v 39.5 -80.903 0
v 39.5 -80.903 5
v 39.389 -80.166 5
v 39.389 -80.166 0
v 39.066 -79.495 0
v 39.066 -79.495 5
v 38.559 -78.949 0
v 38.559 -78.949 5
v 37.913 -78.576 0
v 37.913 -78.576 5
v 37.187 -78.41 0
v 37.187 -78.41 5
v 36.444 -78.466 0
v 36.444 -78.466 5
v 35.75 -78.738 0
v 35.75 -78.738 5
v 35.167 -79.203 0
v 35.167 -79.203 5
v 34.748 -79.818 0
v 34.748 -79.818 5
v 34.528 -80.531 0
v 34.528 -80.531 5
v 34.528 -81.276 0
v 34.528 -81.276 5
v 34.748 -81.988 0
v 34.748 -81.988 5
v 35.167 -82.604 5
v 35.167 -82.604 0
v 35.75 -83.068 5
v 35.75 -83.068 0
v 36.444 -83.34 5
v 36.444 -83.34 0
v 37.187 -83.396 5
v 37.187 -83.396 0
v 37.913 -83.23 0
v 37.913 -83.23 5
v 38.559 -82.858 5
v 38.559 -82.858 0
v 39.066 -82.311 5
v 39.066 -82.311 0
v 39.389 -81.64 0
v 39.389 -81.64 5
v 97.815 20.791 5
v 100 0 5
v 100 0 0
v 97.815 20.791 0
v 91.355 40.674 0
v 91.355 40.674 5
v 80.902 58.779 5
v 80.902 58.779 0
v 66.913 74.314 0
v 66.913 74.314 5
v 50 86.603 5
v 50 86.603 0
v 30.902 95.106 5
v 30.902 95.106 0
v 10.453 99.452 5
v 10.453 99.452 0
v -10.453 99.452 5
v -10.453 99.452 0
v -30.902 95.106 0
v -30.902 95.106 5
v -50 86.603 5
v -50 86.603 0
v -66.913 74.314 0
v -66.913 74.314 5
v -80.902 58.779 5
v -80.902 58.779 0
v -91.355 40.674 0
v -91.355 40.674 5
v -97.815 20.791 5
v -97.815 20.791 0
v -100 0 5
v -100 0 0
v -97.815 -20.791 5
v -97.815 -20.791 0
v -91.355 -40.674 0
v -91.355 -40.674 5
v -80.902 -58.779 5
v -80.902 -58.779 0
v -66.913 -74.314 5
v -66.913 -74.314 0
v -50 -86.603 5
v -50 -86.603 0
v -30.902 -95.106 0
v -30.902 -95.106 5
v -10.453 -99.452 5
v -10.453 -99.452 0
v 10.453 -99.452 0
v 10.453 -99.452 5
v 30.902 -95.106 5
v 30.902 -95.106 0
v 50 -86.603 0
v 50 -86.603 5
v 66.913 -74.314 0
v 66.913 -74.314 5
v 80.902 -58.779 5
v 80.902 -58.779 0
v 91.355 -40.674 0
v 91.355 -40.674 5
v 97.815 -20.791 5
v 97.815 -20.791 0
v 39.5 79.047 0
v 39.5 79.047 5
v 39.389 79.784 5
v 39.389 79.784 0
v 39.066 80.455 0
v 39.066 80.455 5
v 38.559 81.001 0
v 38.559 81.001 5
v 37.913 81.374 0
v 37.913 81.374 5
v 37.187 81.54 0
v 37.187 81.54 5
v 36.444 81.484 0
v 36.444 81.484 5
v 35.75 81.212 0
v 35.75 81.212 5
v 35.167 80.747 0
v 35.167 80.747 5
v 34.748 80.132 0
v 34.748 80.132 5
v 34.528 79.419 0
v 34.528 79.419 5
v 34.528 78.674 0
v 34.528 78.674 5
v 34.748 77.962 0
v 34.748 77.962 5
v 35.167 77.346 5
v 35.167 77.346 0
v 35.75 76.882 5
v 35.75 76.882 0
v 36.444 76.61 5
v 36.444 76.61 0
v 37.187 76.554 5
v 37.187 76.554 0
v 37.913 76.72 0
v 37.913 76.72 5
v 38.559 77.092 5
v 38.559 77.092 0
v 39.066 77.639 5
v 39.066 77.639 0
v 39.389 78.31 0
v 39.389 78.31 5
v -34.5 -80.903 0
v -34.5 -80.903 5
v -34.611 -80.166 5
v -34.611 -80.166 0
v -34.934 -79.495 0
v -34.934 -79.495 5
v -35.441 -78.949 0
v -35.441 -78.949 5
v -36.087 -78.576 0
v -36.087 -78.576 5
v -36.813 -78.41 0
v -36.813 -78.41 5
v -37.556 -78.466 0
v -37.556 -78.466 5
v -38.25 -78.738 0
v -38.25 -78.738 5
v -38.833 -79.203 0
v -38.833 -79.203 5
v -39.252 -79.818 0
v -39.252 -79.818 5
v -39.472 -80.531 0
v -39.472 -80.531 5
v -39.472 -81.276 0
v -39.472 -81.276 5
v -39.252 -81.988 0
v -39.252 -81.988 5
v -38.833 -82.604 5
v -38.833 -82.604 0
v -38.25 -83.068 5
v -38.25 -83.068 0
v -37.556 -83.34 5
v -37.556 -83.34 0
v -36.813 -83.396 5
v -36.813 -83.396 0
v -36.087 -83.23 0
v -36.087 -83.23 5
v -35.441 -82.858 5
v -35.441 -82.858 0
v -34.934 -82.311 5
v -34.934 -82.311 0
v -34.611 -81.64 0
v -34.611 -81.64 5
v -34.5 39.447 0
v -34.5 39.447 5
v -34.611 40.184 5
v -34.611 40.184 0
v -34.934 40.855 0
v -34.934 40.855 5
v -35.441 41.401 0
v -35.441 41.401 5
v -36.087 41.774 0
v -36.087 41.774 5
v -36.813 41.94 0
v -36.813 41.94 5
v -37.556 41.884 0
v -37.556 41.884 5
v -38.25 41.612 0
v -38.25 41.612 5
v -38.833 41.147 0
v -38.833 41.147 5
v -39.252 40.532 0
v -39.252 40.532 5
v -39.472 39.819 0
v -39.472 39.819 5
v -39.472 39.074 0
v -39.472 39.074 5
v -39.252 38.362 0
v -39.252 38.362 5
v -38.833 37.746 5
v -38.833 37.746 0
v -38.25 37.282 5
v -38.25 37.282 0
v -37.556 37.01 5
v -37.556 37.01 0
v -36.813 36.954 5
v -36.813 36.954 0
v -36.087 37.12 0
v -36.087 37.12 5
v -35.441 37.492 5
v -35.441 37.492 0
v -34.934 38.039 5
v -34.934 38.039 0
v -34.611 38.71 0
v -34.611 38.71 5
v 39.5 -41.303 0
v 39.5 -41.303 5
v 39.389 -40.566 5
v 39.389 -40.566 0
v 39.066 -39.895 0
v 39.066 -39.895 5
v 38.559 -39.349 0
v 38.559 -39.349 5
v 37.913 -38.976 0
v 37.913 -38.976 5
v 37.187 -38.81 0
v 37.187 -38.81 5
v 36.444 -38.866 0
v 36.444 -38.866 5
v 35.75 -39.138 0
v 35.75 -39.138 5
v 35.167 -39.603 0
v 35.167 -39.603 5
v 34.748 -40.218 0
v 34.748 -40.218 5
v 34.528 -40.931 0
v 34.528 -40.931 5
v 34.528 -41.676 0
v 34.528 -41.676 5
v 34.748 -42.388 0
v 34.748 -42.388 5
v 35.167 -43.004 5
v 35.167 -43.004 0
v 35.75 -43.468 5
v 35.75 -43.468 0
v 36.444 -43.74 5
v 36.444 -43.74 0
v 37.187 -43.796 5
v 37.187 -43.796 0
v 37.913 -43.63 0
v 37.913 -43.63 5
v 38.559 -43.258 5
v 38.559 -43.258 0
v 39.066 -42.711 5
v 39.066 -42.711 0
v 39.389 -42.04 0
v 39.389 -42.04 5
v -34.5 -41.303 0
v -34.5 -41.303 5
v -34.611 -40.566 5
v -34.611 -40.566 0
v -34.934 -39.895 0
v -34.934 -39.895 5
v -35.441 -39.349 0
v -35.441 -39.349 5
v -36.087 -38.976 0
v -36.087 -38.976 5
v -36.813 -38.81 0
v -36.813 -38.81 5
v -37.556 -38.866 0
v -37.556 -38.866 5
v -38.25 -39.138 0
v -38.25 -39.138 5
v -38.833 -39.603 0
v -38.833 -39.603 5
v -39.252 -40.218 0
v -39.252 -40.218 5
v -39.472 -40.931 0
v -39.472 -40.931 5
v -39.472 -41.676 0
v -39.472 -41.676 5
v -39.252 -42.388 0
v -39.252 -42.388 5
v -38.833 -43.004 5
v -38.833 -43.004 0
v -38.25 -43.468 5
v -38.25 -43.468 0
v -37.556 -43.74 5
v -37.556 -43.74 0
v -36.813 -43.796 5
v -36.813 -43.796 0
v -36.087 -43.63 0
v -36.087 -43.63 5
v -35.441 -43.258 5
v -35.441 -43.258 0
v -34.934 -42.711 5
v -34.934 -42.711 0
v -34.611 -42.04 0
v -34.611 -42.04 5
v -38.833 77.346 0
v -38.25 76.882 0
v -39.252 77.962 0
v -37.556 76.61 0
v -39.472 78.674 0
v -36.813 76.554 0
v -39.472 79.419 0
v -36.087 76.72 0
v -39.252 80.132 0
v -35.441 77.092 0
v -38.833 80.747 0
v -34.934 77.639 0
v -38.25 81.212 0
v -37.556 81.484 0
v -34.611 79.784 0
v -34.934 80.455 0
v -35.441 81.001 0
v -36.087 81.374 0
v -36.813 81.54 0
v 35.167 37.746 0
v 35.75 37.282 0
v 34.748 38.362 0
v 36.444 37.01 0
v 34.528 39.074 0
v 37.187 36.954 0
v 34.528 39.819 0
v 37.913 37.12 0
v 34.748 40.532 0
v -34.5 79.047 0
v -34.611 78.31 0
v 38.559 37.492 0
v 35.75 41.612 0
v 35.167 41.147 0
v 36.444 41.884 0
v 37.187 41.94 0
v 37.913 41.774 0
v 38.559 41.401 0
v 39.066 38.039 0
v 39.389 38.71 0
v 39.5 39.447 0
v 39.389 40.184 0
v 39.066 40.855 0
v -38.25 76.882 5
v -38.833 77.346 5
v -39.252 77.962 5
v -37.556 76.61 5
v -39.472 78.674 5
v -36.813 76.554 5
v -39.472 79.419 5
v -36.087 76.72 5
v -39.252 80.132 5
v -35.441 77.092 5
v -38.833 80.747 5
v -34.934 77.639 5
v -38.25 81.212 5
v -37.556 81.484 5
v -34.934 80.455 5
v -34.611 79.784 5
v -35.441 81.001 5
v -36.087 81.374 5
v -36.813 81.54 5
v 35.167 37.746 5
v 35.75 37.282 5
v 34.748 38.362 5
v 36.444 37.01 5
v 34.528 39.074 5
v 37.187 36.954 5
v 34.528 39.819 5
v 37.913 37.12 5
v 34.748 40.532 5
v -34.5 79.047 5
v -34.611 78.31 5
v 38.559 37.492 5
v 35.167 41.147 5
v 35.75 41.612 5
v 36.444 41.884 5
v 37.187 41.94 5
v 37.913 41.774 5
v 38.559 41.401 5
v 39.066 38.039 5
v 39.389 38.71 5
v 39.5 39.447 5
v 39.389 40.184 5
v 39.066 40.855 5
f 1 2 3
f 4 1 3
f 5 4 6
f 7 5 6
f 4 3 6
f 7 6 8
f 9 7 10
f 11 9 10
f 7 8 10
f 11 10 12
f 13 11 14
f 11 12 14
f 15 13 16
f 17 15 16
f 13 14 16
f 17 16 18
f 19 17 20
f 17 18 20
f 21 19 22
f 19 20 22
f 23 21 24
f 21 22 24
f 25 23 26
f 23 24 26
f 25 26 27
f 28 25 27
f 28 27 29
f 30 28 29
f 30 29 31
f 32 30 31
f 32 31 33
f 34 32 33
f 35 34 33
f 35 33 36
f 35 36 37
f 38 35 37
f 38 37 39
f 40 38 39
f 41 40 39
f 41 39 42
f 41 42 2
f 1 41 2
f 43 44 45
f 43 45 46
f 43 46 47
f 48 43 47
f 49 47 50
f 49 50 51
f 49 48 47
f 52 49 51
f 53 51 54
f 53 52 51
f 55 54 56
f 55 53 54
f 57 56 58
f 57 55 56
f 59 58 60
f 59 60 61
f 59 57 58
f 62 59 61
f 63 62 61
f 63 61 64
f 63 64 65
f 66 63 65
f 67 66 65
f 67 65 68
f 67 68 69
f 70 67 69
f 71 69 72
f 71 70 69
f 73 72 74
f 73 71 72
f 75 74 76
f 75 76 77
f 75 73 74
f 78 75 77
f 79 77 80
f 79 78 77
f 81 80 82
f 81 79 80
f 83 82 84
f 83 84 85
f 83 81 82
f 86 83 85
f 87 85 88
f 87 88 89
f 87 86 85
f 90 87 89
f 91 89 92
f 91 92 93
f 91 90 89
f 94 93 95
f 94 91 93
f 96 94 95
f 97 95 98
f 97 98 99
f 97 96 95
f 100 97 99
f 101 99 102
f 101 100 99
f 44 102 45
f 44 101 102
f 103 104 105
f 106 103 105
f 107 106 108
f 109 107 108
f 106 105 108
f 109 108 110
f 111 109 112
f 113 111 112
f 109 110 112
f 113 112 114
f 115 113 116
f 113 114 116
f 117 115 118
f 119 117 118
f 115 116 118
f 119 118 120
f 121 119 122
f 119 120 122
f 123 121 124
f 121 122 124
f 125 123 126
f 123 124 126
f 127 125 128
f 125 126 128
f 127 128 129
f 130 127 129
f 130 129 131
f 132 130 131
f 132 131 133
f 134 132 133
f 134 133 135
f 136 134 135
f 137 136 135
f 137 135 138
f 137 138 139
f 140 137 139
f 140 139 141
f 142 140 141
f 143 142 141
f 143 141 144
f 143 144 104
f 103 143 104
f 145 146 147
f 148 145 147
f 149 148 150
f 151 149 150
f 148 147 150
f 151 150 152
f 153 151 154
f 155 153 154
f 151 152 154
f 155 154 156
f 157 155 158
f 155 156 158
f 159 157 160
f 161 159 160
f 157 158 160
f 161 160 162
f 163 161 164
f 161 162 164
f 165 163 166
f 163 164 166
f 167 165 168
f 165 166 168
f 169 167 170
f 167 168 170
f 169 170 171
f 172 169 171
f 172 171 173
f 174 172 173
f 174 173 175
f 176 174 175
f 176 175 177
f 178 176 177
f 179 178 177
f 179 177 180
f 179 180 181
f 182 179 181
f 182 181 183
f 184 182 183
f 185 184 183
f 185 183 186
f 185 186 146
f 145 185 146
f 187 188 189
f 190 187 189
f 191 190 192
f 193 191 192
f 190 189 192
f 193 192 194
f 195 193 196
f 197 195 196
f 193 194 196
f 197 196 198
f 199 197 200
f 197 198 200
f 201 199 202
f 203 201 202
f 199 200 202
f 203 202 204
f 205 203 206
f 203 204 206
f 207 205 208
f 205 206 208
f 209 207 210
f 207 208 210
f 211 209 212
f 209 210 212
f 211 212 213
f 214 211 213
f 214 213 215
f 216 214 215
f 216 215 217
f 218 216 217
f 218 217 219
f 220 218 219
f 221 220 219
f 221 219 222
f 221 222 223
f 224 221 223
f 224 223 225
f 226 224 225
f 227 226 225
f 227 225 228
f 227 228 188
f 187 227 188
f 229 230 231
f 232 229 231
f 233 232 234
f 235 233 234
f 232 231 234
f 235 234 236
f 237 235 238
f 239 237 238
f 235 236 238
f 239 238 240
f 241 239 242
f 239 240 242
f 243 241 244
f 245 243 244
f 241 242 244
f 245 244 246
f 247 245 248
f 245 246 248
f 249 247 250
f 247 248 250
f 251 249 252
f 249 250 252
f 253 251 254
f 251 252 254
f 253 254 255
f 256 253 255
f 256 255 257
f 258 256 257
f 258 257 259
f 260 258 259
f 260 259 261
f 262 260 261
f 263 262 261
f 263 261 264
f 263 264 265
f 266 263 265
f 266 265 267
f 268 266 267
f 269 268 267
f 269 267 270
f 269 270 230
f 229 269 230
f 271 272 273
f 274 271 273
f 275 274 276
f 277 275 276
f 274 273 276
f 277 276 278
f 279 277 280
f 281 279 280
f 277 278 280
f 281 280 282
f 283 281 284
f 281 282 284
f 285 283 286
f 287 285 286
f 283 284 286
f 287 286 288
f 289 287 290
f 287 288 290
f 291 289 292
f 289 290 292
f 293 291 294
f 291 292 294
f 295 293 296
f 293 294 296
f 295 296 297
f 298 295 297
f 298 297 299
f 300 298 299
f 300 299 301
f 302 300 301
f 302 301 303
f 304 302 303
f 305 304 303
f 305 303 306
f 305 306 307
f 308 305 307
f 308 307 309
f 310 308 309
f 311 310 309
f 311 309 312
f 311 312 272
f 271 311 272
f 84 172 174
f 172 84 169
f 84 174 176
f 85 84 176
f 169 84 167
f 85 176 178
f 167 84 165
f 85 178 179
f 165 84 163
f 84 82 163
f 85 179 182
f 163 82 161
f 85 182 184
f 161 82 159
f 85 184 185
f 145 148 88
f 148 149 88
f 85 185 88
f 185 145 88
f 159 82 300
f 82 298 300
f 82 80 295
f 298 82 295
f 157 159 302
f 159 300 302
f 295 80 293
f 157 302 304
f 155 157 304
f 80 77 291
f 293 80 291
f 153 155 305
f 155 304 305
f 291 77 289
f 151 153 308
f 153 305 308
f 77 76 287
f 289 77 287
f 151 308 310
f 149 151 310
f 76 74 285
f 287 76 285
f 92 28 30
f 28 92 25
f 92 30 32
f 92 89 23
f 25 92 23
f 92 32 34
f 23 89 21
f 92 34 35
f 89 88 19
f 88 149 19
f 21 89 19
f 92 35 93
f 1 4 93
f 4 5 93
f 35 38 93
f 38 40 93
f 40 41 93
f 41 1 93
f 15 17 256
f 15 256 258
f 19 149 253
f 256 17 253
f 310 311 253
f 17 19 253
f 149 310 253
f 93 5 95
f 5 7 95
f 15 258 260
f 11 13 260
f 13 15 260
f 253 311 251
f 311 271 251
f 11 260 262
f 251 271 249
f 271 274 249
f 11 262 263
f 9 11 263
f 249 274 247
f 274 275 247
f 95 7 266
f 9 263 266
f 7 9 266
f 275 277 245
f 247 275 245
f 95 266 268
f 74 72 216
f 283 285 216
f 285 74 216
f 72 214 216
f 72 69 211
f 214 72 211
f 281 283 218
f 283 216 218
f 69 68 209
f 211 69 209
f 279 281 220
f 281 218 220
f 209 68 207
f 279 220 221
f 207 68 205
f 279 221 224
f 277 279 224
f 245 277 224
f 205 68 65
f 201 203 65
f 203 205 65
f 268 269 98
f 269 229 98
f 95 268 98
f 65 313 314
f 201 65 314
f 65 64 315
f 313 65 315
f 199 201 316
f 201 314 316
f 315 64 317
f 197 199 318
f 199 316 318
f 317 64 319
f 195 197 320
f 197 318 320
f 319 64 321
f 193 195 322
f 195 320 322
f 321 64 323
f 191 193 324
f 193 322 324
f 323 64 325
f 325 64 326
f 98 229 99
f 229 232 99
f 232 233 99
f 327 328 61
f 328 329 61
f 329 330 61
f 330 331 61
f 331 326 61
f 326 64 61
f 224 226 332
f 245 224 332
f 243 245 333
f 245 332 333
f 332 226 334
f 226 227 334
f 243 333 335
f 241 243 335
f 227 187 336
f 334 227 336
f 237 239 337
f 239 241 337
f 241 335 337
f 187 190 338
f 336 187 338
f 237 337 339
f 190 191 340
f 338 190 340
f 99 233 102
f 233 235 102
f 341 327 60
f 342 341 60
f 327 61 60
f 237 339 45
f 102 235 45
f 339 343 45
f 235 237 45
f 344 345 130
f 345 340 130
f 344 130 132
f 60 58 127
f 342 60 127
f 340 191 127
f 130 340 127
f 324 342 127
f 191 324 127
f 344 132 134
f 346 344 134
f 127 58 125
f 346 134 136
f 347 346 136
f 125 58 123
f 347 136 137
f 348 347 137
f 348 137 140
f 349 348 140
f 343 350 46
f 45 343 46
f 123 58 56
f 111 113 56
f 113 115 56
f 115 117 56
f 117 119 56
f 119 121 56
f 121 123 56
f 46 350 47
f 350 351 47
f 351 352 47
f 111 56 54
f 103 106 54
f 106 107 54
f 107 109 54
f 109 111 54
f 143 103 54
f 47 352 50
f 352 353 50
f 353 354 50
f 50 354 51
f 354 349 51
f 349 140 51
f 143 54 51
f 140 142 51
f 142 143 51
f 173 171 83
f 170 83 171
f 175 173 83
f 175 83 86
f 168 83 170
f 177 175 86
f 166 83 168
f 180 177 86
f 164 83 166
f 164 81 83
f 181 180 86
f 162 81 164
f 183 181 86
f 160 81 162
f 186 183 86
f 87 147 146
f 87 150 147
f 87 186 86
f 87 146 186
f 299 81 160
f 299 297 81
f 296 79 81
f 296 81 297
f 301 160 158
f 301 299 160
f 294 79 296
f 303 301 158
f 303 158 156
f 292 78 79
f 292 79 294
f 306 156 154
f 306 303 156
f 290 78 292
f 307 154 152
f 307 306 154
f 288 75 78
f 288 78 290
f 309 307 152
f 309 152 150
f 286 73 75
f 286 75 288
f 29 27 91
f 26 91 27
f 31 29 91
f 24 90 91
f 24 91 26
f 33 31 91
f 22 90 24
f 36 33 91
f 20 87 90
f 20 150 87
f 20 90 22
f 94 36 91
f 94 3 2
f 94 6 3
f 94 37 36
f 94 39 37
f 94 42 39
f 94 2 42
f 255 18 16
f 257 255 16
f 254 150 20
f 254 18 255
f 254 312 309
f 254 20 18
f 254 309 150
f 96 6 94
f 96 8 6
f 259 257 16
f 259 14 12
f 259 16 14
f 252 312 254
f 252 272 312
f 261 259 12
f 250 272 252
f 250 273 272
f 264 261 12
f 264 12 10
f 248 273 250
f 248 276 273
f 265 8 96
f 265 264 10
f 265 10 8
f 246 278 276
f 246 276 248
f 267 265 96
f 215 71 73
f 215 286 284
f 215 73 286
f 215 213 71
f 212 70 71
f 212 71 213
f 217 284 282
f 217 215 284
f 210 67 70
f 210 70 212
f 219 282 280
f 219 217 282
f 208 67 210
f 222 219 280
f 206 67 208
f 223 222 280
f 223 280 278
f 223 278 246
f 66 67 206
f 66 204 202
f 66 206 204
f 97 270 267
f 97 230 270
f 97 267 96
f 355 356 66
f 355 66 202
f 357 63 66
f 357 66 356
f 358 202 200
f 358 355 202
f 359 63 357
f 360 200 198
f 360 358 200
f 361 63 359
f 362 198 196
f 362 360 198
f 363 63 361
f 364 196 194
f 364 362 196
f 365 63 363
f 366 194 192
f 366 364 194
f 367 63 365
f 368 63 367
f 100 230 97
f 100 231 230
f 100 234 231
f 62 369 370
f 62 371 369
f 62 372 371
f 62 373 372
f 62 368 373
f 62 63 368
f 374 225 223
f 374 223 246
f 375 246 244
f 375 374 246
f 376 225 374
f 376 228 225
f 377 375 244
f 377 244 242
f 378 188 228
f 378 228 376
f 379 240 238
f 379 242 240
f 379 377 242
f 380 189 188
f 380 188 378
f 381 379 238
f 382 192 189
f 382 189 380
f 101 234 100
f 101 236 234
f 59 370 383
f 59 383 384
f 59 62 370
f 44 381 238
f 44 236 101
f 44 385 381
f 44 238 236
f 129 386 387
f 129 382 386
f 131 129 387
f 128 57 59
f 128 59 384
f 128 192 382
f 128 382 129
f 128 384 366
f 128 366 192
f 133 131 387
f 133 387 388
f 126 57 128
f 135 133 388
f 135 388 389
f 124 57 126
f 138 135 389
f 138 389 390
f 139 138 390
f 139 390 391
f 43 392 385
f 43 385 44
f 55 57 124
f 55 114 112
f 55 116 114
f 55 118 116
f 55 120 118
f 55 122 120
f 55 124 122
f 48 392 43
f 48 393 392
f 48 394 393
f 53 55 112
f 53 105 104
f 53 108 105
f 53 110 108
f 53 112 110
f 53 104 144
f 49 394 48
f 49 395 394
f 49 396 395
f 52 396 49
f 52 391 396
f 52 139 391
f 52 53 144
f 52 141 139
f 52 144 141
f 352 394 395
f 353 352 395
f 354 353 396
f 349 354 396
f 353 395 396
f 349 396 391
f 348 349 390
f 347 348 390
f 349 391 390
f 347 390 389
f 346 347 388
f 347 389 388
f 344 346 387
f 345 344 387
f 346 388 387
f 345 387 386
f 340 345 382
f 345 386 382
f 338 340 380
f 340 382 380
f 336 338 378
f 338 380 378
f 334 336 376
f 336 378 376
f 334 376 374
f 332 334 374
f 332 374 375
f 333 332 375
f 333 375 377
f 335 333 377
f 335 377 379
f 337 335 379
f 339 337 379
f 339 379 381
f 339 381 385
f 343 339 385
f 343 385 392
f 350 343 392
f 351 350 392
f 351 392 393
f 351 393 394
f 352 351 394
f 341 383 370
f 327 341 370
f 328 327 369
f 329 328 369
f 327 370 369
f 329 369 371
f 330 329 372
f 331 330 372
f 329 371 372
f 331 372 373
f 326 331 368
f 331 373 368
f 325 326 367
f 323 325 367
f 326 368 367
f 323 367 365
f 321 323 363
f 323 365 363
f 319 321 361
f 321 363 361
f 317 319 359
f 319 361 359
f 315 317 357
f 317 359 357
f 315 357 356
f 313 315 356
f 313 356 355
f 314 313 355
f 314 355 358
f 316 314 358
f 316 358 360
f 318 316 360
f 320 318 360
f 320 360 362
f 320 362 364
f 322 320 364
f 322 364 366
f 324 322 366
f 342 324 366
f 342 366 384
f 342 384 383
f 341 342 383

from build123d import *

# Parameters (mm, degrees)
CROQUIS1_R              = 82.42
SALIENTE_EXTRUIR1_DEPTH = 5
CROQUIS2_R              = 100
SALIENTE_EXTRUIR2_DEPTH = 5
CROQUIS3_R              = 2.5
CORTAR_EXTRUIR1_DEPTH   = 10
CROQUIS4_R              = 2.5
CORTAR_EXTRUIR2_DEPTH   = 10


with BuildPart() as part:
    # Croquis1 → Saliente-Extruir1 (new body)
    with BuildSketch(Plane.XY):
        Circle(CROQUIS1_R)
    extrude(amount=SALIENTE_EXTRUIR1_DEPTH)

    # Croquis2 → Saliente-Extruir2 (add)
    with BuildSketch(Plane.XY.offset(5)):
        Circle(CROQUIS2_R)
    extrude(amount=-SALIENTE_EXTRUIR2_DEPTH)

    # Croquis3 → Cortar-Extruir1 (cut)
    with BuildSketch(Plane.XY.offset(5)):
        with Locations((-37, -80.903175403)):
            Circle(CROQUIS3_R)
        with Locations((37, -80.903175403)):
            Circle(CROQUIS3_R)
        with Locations((-37, -41.303175403)):
            Circle(CROQUIS3_R)
        with Locations((37, -41.303175403)):
            Circle(CROQUIS3_R)
    extrude(amount=-CORTAR_EXTRUIR1_DEPTH, mode=Mode.SUBTRACT)

    # Croquis4 → Cortar-Extruir2 (cut)
    with BuildSketch(Plane.XY.offset(5)):
        with Locations((-37, -41.303175403)):
            Circle(CROQUIS4_R)
        with Locations((-37, 39.446824597)):
            Circle(CROQUIS4_R)
        with Locations((-37, -80.903175403)):
            Circle(CROQUIS4_R)
        with Locations((-37, 79.046824597)):
            Circle(CROQUIS4_R)
        with Locations((37, -41.303175403)):
            Circle(CROQUIS4_R)
        with Locations((37, 79.046824597)):
            Circle(CROQUIS4_R)
        with Locations((37, 39.446824597)):
            Circle(CROQUIS4_R)
    extrude(amount=-CORTAR_EXTRUIR2_DEPTH, mode=Mode.SUBTRACT)


solid = part.part
